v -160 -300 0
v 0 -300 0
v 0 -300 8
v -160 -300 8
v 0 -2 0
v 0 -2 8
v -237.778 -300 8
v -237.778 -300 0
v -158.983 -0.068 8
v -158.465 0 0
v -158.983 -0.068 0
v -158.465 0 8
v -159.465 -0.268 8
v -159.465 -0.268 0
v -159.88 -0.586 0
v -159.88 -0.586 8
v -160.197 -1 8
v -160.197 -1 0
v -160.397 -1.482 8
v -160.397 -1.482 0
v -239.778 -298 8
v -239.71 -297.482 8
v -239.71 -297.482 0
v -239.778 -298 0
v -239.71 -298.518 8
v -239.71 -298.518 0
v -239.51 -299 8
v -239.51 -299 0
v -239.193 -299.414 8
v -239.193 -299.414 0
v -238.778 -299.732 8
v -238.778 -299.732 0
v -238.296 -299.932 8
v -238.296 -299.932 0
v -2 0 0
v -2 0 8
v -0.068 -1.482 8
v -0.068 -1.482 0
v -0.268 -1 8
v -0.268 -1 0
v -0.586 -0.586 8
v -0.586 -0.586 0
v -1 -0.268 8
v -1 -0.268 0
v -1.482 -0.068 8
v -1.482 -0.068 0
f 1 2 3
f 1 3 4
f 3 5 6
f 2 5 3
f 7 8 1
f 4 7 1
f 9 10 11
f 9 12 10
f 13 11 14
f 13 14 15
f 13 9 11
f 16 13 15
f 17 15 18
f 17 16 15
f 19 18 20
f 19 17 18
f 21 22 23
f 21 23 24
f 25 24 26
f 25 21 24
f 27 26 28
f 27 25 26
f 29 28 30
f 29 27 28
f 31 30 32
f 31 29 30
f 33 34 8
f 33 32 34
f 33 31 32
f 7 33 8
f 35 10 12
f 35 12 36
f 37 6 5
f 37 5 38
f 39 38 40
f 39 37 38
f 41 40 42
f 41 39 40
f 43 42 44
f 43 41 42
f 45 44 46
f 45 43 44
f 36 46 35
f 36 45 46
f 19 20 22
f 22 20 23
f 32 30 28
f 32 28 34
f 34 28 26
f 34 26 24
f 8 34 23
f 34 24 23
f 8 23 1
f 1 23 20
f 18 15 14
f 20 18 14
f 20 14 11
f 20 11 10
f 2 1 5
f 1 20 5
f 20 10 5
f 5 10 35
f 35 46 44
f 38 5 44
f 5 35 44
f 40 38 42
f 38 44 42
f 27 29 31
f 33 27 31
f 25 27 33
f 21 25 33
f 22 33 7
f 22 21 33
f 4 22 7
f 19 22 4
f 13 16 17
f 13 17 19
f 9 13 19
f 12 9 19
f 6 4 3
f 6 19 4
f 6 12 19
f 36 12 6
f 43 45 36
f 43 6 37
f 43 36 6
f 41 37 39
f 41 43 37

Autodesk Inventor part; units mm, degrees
ref_plane "YZ Plane" through (0, 0, 0) normal (1, 0, 0) x (0, 1, 0)
ref_plane "XZ Plane" through (0, 0, 0) normal (0, 1, 0) x (-1, 0, 0)
ref_plane "XY Plane" through (0, 0, 0) normal (0, 0, 1) x (1, 0, 0)
sketch "Sketch1" plane through (0, 0, 0) normal (0, 0, 1) x (1, 0, 0)
  line L0 (-160, 0) -> (0, 0)
  line L1 (-160, -300) -> (-160, 0) construction
  line L2 (-160, 0) -> (-240.3848, -300)
  line L3 (-240.3848, -300) -> (-160, -300)
  line L4 (0, 0) -> (-80.3848, -300) construction
  line L5 (0, 0) -> (160, 0)
  line L6 (0, 0) -> (0, -300)
  line L7 (0, -300) -> (-160, -300)
  dimension "d2" = 15
  dimension "d29" = 160
  dimension "d40" = 300
  dimension "d41" = 15
extrude "Plate1" add sketch "Sketch1" along normal blind 8
fillet "Corner Round1" radius 2 3 edges at (-240.3848, -300, 4) (0, 0, 4) (-160, 0, 4)
equation "\"d3\" = Thickness"
equation "\"BendRadius\" = Thickness"
equation "\"BendReliefWidth\" = Thickness"
equation "\"BendReliefDepth\" = 0.5 * Thickness"
equation "\"CornerReliefSize\" = 4 * Thickness"
equation "\"MinimumRemnant\" = 2 * Thickness"
equation "\"TransitionRadius\" = BendRadius"
equation "\"JacobiRadiusSize\" = BendRadius"
equation "\"GapSize\" = Thickness"
equation "\"Thickness\" = 8"
properties part number "Сrane plate 4"
